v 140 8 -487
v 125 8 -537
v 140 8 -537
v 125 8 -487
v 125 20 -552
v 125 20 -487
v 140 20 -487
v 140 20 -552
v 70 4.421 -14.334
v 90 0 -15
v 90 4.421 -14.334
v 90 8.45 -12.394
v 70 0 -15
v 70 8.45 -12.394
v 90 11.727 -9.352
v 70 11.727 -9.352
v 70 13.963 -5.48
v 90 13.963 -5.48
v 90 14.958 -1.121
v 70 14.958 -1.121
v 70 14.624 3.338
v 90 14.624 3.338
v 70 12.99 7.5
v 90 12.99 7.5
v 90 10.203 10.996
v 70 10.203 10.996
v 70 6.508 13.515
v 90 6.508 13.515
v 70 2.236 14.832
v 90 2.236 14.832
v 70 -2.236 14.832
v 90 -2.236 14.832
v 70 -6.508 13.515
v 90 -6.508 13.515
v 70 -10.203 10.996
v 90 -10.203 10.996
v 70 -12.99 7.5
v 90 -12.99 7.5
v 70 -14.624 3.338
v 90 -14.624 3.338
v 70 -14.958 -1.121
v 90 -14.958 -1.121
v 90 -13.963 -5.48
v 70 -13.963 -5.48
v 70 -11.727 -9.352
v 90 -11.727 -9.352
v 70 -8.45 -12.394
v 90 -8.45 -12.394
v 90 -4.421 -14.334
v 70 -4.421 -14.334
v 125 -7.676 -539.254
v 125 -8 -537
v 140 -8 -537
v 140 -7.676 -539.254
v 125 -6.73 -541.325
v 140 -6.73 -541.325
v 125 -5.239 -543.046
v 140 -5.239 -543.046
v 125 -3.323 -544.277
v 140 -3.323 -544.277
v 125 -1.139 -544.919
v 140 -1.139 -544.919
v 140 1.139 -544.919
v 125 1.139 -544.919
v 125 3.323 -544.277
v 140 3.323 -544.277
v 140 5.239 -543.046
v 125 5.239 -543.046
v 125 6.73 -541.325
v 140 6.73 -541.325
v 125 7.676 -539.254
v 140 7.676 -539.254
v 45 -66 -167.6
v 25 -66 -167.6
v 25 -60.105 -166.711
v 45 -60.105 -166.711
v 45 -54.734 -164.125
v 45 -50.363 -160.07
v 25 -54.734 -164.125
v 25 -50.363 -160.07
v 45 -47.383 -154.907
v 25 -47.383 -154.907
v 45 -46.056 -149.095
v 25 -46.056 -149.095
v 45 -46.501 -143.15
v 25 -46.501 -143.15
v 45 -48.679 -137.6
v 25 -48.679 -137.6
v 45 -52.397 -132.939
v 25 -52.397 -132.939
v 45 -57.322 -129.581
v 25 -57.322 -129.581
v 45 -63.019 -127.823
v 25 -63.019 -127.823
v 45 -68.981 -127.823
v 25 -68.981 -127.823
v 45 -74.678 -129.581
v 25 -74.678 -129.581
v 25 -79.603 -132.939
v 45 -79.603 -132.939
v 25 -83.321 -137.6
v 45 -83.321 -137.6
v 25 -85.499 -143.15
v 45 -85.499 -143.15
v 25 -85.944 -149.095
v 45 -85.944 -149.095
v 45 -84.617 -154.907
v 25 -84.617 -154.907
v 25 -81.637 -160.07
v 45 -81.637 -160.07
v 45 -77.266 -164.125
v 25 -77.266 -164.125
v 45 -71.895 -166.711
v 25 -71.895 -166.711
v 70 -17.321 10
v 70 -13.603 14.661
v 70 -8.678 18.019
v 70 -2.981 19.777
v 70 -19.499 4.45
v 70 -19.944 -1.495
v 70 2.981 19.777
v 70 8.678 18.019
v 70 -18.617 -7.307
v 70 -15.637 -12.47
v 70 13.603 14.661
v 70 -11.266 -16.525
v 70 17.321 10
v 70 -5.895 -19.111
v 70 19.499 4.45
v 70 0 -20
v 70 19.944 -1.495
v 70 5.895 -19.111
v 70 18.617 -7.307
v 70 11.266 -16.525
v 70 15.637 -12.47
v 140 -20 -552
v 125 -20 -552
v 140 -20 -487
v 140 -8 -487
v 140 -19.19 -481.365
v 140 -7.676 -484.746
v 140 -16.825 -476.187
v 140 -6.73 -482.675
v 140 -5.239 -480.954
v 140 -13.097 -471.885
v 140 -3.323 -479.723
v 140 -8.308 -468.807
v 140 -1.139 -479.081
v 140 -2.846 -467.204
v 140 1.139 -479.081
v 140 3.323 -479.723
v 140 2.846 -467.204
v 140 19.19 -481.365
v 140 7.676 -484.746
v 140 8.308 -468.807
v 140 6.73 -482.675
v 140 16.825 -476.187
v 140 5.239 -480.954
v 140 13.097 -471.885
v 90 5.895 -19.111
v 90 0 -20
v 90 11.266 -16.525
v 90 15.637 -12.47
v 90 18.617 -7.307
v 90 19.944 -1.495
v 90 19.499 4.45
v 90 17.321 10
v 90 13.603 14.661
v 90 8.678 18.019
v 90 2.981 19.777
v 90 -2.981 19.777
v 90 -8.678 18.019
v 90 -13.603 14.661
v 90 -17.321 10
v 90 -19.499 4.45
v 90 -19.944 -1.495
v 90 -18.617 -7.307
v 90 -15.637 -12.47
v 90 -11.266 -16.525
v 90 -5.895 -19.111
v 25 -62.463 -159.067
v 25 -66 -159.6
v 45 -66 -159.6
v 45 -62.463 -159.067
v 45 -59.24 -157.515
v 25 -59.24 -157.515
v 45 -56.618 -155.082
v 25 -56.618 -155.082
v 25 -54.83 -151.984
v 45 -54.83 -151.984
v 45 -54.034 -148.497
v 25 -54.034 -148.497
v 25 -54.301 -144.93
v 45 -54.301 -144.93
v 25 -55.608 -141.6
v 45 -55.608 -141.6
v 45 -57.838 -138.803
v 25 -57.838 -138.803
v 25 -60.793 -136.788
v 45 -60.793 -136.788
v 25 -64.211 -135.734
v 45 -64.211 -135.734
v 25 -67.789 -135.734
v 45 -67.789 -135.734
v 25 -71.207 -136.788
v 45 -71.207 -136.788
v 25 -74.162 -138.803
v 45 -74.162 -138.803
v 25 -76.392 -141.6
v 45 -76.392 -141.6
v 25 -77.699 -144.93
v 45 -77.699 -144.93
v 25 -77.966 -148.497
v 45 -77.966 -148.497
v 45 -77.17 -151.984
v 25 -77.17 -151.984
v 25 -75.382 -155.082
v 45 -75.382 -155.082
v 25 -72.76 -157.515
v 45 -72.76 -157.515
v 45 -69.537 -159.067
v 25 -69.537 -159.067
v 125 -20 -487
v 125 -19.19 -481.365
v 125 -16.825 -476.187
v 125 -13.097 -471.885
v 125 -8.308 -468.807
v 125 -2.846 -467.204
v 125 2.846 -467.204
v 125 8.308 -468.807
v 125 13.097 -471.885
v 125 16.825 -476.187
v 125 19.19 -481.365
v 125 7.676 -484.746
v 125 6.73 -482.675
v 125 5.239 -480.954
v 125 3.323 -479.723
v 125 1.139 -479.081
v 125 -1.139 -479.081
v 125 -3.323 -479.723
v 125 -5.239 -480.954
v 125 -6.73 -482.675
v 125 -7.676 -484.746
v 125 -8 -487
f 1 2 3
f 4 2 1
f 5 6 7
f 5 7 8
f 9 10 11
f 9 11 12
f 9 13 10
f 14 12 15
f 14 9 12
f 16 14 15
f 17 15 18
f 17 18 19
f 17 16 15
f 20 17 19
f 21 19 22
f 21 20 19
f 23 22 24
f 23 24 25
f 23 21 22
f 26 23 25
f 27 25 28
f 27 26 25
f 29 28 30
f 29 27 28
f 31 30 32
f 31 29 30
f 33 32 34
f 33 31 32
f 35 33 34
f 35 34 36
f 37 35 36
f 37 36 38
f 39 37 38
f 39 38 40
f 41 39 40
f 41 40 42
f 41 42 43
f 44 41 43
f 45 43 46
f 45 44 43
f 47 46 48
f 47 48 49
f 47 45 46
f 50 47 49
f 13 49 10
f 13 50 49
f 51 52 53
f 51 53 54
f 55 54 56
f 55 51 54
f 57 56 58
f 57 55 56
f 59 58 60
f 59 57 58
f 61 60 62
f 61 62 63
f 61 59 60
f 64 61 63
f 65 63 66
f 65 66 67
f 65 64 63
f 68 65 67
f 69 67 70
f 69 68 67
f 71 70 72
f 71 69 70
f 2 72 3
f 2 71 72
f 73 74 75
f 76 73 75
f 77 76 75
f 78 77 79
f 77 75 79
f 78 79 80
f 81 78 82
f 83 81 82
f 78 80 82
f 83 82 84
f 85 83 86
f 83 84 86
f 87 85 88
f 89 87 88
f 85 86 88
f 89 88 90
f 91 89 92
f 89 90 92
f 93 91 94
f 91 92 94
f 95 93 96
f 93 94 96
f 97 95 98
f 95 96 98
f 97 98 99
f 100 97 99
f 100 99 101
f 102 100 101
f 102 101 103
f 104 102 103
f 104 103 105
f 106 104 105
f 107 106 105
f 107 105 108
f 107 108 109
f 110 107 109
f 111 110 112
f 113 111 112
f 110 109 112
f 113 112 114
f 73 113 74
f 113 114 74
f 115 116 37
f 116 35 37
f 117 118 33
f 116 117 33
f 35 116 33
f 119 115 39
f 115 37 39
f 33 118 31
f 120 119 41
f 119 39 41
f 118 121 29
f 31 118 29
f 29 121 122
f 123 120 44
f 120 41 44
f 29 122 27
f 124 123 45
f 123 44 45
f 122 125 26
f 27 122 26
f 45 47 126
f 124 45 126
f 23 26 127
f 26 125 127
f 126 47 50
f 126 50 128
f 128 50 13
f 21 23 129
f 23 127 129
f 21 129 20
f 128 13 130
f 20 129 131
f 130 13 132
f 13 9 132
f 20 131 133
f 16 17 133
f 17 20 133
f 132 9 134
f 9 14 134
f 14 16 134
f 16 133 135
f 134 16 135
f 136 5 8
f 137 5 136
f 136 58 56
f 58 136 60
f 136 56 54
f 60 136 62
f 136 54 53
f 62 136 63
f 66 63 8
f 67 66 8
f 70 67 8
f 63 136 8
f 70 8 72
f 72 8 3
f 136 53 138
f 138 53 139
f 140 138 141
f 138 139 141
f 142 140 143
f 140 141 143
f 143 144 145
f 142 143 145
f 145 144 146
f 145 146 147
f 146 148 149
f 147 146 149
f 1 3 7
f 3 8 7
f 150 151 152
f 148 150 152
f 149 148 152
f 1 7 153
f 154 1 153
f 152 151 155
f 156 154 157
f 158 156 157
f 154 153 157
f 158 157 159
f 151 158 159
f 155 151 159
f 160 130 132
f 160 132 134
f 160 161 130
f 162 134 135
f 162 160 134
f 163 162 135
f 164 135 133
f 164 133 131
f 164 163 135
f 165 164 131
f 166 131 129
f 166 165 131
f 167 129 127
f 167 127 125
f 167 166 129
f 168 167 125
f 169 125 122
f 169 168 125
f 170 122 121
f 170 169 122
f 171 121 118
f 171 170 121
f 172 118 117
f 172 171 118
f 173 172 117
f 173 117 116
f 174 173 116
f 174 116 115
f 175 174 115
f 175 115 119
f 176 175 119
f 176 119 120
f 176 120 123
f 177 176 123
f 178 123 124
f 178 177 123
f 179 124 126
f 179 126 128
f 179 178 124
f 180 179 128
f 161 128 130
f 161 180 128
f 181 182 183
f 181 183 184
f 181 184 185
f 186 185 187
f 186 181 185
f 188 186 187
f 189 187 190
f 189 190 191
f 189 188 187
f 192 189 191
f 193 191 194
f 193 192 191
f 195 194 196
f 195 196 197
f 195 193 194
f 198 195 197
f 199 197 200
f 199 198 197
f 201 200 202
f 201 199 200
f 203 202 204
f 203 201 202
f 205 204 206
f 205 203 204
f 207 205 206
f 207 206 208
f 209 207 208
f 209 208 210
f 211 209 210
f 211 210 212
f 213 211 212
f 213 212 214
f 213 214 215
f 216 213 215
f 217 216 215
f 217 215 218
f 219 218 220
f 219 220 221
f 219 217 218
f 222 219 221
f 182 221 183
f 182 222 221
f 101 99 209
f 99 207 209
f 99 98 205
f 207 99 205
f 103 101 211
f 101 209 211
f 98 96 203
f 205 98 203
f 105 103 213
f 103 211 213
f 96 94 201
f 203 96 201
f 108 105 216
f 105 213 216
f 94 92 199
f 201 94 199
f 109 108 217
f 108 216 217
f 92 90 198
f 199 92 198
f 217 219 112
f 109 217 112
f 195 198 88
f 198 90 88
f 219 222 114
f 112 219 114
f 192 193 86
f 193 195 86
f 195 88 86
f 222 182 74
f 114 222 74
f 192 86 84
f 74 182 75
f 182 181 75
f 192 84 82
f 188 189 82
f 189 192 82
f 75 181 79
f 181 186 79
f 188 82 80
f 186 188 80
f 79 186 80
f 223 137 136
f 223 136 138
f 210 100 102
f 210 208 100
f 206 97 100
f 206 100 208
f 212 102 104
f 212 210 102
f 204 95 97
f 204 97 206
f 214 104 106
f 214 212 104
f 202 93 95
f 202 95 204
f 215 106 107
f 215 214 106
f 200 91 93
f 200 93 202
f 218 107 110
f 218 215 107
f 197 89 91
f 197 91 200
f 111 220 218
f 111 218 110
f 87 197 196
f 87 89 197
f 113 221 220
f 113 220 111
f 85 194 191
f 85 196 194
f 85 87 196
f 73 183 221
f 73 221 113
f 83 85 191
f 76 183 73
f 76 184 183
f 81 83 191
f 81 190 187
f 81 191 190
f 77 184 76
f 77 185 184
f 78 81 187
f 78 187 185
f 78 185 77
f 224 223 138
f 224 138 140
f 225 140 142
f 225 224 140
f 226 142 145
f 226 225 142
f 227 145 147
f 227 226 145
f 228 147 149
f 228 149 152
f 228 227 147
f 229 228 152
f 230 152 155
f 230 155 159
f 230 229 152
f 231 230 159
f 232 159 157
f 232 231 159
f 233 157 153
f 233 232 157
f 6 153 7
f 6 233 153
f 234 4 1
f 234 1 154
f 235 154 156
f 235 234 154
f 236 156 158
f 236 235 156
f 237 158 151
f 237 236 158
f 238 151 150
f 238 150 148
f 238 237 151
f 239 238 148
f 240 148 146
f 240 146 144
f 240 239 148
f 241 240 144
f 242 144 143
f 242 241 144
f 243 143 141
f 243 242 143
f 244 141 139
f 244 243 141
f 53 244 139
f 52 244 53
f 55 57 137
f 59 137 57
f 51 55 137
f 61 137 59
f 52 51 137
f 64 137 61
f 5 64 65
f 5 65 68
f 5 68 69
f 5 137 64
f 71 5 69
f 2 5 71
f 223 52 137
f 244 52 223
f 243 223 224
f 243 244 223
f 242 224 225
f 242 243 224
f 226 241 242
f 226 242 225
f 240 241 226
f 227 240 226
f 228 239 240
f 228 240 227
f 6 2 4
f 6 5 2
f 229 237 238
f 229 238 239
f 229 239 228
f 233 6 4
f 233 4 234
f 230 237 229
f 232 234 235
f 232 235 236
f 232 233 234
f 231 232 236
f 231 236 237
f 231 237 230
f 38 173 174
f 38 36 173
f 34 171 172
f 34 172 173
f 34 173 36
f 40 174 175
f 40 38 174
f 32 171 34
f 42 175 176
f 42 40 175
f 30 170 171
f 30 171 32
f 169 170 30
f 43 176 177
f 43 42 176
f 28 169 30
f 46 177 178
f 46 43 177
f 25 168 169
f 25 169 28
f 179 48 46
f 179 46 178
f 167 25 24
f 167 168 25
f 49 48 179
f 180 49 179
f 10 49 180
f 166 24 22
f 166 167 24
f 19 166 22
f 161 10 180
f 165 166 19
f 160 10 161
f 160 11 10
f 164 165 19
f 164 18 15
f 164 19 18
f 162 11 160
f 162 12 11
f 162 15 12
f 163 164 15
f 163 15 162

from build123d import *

# Parameters (mm, degrees)
RAMA_START               = -55
SZKIC_INSERT_RAMA_R      = 20
SZKIC_INSERT_RAMA_R_2    = 15
RAMA_DEPTH               = 10
LINKAGE_START            = 25
SZKIC_INSERT_LINKAGE_R   = 20
SZKIC_INSERT_LINKAGE_R_2 = 12
LINKAGE_DEPTH            = 20
TYLNE_KO_O_DEPTH         = 15


with BuildPart() as part:
    # Szkic - insert - rama → Rama (new body, symmetric)
    with BuildSketch(Plane(origin=(135, 0, 0), x_dir=(0, 0, -1), z_dir=(1, 0, 0)).offset(RAMA_START)):
        Circle(SZKIC_INSERT_RAMA_R)
        Circle(SZKIC_INSERT_RAMA_R_2, mode=Mode.SUBTRACT)
    extrude(amount=RAMA_DEPTH, both=True)


with BuildPart() as body_2:
    # Szkic - insert - linkage → Linkage (new body)
    with BuildSketch(Plane(origin=(0, 0, 0), x_dir=(0, 0, -1), z_dir=(1, 0, 0)).offset(LINKAGE_START)):
        with Locations((147.6, -66)):
            Circle(SZKIC_INSERT_LINKAGE_R)
        with Locations((147.6, -66)):
            Circle(SZKIC_INSERT_LINKAGE_R_2, mode=Mode.SUBTRACT)
    extrude(amount=LINKAGE_DEPTH)


with BuildPart() as body_3:
    # Szkic - insert - tylne koło → Tylne koło (new body)
    with BuildSketch(Plane(origin=(125, 0, 0), x_dir=(0, 0, -1), z_dir=(1, 0, 0))):
        with BuildLine():
            Line((487, 20), (552, 20))
            Line((552, 20), (552, -20))
            Line((552, -20), (487, -20))
            ThreePointArc((487, -20), (467, 0), (487, 20))
        make_face()
        with BuildLine():
            Line((537, 8), (487, 8))
            ThreePointArc((487, 8), (479, 0), (487, -8))
            Line((487, -8), (537, -8))
            ThreePointArc((537, -8), (545, 0), (537, 8))
        make_face(mode=Mode.SUBTRACT)
    extrude(amount=TYLNE_KO_O_DEPTH)


solid = Compound([part.part, body_2.part, body_3.part])
